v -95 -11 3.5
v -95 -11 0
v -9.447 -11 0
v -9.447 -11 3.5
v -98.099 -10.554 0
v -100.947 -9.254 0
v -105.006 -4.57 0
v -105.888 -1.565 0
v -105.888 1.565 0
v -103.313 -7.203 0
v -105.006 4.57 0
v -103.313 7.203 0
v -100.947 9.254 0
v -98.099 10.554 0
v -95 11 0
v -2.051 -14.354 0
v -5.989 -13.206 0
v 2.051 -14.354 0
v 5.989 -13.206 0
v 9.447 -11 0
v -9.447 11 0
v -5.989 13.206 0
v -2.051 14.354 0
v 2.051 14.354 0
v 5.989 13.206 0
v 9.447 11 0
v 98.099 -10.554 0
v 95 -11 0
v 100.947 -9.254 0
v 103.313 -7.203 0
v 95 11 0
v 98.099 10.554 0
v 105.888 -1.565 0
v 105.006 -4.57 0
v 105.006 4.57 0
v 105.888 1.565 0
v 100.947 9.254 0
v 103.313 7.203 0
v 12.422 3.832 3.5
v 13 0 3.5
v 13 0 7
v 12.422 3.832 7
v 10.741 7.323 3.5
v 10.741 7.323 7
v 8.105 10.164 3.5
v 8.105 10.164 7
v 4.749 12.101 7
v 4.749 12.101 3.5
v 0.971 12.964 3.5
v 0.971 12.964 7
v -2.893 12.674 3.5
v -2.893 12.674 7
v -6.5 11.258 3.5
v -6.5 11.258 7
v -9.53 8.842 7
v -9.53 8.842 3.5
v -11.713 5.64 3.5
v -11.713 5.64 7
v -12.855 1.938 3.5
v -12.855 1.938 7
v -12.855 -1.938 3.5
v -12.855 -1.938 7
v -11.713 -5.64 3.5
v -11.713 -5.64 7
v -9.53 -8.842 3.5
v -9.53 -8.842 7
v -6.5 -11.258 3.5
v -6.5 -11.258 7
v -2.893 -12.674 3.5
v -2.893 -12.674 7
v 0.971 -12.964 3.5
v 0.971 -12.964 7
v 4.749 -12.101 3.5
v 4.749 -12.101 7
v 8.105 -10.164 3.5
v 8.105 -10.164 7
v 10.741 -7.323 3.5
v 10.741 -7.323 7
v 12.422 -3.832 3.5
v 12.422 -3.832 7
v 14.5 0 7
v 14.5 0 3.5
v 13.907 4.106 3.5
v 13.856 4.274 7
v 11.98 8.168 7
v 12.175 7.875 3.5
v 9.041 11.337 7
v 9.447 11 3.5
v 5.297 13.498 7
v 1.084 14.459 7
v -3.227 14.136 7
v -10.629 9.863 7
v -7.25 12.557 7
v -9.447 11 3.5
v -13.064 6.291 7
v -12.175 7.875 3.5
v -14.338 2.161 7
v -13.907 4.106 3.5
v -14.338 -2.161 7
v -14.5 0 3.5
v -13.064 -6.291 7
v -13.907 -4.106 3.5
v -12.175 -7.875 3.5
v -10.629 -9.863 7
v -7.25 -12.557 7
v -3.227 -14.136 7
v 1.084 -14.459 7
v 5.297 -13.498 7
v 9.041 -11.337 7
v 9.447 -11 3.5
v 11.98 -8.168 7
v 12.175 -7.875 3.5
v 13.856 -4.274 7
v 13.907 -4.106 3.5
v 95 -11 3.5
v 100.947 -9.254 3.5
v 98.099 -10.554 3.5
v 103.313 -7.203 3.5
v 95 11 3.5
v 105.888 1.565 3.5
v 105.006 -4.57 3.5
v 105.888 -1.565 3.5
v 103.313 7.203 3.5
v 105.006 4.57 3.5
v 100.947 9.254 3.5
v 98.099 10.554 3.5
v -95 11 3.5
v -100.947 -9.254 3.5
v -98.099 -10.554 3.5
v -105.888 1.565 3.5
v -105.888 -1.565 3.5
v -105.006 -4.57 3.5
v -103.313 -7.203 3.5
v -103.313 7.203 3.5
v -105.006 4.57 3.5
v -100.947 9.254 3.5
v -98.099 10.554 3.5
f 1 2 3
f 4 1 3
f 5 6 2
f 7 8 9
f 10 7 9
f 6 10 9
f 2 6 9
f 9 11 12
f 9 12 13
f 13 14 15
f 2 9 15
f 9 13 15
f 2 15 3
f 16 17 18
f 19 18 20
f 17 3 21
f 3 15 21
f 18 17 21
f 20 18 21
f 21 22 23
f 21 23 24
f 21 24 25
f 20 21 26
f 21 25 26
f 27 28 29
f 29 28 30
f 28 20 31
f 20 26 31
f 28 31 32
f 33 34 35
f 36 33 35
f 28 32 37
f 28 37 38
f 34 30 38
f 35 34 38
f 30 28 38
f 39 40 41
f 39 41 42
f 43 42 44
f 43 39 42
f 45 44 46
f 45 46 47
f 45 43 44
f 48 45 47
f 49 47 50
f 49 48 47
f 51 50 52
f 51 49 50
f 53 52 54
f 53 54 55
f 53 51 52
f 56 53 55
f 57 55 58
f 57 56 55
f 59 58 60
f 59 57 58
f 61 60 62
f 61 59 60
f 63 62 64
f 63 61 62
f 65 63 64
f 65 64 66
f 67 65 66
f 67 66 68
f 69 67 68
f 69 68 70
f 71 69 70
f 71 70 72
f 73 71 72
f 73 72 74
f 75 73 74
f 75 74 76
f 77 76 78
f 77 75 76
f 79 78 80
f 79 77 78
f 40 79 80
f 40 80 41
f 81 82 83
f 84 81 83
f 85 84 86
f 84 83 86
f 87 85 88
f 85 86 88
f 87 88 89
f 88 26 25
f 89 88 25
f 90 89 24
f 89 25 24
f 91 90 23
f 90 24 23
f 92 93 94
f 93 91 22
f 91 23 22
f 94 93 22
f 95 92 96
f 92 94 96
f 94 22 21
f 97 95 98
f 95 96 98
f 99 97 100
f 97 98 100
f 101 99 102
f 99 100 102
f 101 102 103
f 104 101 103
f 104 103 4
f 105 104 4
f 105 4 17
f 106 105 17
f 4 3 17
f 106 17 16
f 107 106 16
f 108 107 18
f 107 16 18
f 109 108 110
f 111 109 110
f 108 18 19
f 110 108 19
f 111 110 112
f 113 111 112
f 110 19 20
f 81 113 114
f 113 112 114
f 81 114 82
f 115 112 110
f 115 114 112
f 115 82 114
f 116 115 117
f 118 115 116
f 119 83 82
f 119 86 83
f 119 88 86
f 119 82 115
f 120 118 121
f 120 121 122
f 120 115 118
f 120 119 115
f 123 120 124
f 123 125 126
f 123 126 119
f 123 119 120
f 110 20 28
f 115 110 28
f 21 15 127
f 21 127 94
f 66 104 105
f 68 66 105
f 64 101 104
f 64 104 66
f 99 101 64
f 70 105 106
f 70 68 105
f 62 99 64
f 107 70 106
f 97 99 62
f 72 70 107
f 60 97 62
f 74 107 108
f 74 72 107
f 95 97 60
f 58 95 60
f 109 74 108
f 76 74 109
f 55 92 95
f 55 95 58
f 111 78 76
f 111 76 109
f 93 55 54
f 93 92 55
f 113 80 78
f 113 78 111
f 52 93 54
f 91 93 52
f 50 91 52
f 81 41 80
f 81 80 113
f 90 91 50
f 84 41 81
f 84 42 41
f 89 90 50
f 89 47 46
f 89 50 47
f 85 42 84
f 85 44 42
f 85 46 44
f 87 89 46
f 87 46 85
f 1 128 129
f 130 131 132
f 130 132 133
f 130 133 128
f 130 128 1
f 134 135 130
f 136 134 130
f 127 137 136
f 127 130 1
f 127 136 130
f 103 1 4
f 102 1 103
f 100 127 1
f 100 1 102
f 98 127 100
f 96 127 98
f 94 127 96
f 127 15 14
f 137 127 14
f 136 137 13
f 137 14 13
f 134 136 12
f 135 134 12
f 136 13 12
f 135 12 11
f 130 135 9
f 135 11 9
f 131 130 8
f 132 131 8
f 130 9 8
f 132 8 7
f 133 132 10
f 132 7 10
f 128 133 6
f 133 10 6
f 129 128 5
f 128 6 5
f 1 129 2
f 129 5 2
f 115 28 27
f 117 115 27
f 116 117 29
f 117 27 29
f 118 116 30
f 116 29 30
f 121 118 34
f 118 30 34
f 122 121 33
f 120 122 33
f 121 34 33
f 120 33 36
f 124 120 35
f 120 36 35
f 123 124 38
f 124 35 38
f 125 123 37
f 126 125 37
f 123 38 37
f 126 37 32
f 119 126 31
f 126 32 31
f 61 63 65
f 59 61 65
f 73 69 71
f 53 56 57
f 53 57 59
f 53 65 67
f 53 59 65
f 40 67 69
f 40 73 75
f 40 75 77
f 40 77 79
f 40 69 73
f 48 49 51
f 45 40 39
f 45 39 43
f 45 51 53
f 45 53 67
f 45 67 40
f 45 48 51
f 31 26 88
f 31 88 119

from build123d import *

# Parameters (mm, degrees)
SKETCH_3_R      = 14.5
SKETCH_3_R_2    = 11
SKETCH_3_W      = 190
SKETCH_3_H      = 22
EXTRUDE_2_DEPTH = 3.5
SKETCH_5_R      = 14.5
SKETCH_5_R_2    = 13
EXTRUDE_3_DEPTH = 3.5


with BuildPart() as part:
    # Эскиз3 → Бобышка-Вытянуть2 (new body)
    with BuildSketch(Plane.XY):
        Circle(SKETCH_3_R)
        with Locations((-95, 0)):
            Circle(SKETCH_3_R_2)
        with Locations((95, 0)):
            Circle(SKETCH_3_R_2)
        Rectangle(SKETCH_3_W, SKETCH_3_H)
    extrude(amount=EXTRUDE_2_DEPTH)

    # Эскиз5 → Бобышка-Вытянуть3 (add)
    with BuildSketch(Plane.XY.offset(3.5)):
        Circle(SKETCH_5_R)
        Circle(SKETCH_5_R_2, mode=Mode.SUBTRACT)
    extrude(amount=EXTRUDE_3_DEPTH)


solid = part.part
